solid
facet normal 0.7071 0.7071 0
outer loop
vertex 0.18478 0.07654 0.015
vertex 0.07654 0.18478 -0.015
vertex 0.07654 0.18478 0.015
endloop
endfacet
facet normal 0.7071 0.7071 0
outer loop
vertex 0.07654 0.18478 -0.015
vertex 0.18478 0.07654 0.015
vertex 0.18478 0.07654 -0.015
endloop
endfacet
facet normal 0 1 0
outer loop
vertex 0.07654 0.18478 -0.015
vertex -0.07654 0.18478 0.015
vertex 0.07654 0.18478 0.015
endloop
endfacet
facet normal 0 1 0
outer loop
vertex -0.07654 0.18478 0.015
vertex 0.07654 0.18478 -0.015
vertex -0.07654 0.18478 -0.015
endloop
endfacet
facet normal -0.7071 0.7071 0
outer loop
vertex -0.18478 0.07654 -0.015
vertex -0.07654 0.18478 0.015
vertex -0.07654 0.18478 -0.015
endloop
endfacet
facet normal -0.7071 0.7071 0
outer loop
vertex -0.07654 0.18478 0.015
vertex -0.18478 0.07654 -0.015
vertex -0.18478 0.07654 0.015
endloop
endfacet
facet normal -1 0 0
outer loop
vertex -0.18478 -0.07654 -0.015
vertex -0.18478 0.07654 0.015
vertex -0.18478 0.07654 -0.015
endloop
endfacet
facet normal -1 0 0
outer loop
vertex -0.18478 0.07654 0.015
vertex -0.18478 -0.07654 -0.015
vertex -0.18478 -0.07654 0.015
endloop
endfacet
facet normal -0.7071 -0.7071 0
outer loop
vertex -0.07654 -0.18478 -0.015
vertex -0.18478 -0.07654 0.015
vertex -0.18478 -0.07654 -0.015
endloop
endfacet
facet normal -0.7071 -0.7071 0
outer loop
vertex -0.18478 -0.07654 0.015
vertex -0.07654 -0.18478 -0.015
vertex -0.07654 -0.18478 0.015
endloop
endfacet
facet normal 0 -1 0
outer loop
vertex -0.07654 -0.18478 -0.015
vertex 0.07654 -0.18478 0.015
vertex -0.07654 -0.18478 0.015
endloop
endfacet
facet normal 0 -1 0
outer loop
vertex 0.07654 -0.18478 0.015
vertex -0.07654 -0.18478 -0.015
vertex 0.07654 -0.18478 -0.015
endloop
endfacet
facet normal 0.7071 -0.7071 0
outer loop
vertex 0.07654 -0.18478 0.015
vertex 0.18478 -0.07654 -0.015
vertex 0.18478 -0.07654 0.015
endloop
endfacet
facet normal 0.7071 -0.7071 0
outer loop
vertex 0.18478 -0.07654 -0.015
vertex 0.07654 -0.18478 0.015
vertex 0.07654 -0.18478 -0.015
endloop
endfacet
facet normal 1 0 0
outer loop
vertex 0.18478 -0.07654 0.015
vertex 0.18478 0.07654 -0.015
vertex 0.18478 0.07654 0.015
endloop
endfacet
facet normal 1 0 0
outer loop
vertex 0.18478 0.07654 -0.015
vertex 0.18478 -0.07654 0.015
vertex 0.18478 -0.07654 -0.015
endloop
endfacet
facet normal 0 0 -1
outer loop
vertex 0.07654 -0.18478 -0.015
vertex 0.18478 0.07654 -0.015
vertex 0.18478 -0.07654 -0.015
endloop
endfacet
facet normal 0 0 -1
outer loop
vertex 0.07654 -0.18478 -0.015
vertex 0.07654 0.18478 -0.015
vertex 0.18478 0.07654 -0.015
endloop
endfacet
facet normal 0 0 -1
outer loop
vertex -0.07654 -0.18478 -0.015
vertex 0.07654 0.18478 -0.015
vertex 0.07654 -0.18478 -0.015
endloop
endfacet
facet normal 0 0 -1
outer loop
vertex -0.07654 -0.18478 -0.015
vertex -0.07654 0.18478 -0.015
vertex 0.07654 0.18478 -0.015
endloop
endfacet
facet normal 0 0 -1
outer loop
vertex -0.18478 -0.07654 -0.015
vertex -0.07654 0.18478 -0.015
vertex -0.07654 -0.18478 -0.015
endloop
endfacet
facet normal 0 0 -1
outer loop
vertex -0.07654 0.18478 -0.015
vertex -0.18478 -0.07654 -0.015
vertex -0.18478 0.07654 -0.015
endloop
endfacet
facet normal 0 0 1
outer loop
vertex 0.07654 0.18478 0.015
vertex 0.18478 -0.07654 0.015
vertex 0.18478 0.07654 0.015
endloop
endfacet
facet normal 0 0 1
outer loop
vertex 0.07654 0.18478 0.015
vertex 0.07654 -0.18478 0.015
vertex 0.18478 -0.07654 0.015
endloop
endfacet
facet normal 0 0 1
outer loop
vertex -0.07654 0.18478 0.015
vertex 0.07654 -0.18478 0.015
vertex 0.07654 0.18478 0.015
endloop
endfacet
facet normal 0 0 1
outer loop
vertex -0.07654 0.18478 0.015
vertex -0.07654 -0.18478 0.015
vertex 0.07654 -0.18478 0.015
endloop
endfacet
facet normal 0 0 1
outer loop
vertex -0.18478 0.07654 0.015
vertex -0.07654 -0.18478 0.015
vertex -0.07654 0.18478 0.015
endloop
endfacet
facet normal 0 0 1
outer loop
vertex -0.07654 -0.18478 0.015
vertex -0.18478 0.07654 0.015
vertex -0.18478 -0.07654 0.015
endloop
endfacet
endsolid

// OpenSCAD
use <lib.scad>

hd = 72;
ld = 12;

module padHD() {
	rotate([0,0,22.5]) cyl(0.2, 0.2, 0.03, $fn=8);
}

module edgeHD() {
	rotate([0,0,22.5]) difference() {
		cyl(0.25, 0.25, 0.03, $fn=8);
		cyl(0.20, 0.20, 0.1, $fn=8);
	}
}

padHD($fn=hd);
//edgeHD($fn=hd);
